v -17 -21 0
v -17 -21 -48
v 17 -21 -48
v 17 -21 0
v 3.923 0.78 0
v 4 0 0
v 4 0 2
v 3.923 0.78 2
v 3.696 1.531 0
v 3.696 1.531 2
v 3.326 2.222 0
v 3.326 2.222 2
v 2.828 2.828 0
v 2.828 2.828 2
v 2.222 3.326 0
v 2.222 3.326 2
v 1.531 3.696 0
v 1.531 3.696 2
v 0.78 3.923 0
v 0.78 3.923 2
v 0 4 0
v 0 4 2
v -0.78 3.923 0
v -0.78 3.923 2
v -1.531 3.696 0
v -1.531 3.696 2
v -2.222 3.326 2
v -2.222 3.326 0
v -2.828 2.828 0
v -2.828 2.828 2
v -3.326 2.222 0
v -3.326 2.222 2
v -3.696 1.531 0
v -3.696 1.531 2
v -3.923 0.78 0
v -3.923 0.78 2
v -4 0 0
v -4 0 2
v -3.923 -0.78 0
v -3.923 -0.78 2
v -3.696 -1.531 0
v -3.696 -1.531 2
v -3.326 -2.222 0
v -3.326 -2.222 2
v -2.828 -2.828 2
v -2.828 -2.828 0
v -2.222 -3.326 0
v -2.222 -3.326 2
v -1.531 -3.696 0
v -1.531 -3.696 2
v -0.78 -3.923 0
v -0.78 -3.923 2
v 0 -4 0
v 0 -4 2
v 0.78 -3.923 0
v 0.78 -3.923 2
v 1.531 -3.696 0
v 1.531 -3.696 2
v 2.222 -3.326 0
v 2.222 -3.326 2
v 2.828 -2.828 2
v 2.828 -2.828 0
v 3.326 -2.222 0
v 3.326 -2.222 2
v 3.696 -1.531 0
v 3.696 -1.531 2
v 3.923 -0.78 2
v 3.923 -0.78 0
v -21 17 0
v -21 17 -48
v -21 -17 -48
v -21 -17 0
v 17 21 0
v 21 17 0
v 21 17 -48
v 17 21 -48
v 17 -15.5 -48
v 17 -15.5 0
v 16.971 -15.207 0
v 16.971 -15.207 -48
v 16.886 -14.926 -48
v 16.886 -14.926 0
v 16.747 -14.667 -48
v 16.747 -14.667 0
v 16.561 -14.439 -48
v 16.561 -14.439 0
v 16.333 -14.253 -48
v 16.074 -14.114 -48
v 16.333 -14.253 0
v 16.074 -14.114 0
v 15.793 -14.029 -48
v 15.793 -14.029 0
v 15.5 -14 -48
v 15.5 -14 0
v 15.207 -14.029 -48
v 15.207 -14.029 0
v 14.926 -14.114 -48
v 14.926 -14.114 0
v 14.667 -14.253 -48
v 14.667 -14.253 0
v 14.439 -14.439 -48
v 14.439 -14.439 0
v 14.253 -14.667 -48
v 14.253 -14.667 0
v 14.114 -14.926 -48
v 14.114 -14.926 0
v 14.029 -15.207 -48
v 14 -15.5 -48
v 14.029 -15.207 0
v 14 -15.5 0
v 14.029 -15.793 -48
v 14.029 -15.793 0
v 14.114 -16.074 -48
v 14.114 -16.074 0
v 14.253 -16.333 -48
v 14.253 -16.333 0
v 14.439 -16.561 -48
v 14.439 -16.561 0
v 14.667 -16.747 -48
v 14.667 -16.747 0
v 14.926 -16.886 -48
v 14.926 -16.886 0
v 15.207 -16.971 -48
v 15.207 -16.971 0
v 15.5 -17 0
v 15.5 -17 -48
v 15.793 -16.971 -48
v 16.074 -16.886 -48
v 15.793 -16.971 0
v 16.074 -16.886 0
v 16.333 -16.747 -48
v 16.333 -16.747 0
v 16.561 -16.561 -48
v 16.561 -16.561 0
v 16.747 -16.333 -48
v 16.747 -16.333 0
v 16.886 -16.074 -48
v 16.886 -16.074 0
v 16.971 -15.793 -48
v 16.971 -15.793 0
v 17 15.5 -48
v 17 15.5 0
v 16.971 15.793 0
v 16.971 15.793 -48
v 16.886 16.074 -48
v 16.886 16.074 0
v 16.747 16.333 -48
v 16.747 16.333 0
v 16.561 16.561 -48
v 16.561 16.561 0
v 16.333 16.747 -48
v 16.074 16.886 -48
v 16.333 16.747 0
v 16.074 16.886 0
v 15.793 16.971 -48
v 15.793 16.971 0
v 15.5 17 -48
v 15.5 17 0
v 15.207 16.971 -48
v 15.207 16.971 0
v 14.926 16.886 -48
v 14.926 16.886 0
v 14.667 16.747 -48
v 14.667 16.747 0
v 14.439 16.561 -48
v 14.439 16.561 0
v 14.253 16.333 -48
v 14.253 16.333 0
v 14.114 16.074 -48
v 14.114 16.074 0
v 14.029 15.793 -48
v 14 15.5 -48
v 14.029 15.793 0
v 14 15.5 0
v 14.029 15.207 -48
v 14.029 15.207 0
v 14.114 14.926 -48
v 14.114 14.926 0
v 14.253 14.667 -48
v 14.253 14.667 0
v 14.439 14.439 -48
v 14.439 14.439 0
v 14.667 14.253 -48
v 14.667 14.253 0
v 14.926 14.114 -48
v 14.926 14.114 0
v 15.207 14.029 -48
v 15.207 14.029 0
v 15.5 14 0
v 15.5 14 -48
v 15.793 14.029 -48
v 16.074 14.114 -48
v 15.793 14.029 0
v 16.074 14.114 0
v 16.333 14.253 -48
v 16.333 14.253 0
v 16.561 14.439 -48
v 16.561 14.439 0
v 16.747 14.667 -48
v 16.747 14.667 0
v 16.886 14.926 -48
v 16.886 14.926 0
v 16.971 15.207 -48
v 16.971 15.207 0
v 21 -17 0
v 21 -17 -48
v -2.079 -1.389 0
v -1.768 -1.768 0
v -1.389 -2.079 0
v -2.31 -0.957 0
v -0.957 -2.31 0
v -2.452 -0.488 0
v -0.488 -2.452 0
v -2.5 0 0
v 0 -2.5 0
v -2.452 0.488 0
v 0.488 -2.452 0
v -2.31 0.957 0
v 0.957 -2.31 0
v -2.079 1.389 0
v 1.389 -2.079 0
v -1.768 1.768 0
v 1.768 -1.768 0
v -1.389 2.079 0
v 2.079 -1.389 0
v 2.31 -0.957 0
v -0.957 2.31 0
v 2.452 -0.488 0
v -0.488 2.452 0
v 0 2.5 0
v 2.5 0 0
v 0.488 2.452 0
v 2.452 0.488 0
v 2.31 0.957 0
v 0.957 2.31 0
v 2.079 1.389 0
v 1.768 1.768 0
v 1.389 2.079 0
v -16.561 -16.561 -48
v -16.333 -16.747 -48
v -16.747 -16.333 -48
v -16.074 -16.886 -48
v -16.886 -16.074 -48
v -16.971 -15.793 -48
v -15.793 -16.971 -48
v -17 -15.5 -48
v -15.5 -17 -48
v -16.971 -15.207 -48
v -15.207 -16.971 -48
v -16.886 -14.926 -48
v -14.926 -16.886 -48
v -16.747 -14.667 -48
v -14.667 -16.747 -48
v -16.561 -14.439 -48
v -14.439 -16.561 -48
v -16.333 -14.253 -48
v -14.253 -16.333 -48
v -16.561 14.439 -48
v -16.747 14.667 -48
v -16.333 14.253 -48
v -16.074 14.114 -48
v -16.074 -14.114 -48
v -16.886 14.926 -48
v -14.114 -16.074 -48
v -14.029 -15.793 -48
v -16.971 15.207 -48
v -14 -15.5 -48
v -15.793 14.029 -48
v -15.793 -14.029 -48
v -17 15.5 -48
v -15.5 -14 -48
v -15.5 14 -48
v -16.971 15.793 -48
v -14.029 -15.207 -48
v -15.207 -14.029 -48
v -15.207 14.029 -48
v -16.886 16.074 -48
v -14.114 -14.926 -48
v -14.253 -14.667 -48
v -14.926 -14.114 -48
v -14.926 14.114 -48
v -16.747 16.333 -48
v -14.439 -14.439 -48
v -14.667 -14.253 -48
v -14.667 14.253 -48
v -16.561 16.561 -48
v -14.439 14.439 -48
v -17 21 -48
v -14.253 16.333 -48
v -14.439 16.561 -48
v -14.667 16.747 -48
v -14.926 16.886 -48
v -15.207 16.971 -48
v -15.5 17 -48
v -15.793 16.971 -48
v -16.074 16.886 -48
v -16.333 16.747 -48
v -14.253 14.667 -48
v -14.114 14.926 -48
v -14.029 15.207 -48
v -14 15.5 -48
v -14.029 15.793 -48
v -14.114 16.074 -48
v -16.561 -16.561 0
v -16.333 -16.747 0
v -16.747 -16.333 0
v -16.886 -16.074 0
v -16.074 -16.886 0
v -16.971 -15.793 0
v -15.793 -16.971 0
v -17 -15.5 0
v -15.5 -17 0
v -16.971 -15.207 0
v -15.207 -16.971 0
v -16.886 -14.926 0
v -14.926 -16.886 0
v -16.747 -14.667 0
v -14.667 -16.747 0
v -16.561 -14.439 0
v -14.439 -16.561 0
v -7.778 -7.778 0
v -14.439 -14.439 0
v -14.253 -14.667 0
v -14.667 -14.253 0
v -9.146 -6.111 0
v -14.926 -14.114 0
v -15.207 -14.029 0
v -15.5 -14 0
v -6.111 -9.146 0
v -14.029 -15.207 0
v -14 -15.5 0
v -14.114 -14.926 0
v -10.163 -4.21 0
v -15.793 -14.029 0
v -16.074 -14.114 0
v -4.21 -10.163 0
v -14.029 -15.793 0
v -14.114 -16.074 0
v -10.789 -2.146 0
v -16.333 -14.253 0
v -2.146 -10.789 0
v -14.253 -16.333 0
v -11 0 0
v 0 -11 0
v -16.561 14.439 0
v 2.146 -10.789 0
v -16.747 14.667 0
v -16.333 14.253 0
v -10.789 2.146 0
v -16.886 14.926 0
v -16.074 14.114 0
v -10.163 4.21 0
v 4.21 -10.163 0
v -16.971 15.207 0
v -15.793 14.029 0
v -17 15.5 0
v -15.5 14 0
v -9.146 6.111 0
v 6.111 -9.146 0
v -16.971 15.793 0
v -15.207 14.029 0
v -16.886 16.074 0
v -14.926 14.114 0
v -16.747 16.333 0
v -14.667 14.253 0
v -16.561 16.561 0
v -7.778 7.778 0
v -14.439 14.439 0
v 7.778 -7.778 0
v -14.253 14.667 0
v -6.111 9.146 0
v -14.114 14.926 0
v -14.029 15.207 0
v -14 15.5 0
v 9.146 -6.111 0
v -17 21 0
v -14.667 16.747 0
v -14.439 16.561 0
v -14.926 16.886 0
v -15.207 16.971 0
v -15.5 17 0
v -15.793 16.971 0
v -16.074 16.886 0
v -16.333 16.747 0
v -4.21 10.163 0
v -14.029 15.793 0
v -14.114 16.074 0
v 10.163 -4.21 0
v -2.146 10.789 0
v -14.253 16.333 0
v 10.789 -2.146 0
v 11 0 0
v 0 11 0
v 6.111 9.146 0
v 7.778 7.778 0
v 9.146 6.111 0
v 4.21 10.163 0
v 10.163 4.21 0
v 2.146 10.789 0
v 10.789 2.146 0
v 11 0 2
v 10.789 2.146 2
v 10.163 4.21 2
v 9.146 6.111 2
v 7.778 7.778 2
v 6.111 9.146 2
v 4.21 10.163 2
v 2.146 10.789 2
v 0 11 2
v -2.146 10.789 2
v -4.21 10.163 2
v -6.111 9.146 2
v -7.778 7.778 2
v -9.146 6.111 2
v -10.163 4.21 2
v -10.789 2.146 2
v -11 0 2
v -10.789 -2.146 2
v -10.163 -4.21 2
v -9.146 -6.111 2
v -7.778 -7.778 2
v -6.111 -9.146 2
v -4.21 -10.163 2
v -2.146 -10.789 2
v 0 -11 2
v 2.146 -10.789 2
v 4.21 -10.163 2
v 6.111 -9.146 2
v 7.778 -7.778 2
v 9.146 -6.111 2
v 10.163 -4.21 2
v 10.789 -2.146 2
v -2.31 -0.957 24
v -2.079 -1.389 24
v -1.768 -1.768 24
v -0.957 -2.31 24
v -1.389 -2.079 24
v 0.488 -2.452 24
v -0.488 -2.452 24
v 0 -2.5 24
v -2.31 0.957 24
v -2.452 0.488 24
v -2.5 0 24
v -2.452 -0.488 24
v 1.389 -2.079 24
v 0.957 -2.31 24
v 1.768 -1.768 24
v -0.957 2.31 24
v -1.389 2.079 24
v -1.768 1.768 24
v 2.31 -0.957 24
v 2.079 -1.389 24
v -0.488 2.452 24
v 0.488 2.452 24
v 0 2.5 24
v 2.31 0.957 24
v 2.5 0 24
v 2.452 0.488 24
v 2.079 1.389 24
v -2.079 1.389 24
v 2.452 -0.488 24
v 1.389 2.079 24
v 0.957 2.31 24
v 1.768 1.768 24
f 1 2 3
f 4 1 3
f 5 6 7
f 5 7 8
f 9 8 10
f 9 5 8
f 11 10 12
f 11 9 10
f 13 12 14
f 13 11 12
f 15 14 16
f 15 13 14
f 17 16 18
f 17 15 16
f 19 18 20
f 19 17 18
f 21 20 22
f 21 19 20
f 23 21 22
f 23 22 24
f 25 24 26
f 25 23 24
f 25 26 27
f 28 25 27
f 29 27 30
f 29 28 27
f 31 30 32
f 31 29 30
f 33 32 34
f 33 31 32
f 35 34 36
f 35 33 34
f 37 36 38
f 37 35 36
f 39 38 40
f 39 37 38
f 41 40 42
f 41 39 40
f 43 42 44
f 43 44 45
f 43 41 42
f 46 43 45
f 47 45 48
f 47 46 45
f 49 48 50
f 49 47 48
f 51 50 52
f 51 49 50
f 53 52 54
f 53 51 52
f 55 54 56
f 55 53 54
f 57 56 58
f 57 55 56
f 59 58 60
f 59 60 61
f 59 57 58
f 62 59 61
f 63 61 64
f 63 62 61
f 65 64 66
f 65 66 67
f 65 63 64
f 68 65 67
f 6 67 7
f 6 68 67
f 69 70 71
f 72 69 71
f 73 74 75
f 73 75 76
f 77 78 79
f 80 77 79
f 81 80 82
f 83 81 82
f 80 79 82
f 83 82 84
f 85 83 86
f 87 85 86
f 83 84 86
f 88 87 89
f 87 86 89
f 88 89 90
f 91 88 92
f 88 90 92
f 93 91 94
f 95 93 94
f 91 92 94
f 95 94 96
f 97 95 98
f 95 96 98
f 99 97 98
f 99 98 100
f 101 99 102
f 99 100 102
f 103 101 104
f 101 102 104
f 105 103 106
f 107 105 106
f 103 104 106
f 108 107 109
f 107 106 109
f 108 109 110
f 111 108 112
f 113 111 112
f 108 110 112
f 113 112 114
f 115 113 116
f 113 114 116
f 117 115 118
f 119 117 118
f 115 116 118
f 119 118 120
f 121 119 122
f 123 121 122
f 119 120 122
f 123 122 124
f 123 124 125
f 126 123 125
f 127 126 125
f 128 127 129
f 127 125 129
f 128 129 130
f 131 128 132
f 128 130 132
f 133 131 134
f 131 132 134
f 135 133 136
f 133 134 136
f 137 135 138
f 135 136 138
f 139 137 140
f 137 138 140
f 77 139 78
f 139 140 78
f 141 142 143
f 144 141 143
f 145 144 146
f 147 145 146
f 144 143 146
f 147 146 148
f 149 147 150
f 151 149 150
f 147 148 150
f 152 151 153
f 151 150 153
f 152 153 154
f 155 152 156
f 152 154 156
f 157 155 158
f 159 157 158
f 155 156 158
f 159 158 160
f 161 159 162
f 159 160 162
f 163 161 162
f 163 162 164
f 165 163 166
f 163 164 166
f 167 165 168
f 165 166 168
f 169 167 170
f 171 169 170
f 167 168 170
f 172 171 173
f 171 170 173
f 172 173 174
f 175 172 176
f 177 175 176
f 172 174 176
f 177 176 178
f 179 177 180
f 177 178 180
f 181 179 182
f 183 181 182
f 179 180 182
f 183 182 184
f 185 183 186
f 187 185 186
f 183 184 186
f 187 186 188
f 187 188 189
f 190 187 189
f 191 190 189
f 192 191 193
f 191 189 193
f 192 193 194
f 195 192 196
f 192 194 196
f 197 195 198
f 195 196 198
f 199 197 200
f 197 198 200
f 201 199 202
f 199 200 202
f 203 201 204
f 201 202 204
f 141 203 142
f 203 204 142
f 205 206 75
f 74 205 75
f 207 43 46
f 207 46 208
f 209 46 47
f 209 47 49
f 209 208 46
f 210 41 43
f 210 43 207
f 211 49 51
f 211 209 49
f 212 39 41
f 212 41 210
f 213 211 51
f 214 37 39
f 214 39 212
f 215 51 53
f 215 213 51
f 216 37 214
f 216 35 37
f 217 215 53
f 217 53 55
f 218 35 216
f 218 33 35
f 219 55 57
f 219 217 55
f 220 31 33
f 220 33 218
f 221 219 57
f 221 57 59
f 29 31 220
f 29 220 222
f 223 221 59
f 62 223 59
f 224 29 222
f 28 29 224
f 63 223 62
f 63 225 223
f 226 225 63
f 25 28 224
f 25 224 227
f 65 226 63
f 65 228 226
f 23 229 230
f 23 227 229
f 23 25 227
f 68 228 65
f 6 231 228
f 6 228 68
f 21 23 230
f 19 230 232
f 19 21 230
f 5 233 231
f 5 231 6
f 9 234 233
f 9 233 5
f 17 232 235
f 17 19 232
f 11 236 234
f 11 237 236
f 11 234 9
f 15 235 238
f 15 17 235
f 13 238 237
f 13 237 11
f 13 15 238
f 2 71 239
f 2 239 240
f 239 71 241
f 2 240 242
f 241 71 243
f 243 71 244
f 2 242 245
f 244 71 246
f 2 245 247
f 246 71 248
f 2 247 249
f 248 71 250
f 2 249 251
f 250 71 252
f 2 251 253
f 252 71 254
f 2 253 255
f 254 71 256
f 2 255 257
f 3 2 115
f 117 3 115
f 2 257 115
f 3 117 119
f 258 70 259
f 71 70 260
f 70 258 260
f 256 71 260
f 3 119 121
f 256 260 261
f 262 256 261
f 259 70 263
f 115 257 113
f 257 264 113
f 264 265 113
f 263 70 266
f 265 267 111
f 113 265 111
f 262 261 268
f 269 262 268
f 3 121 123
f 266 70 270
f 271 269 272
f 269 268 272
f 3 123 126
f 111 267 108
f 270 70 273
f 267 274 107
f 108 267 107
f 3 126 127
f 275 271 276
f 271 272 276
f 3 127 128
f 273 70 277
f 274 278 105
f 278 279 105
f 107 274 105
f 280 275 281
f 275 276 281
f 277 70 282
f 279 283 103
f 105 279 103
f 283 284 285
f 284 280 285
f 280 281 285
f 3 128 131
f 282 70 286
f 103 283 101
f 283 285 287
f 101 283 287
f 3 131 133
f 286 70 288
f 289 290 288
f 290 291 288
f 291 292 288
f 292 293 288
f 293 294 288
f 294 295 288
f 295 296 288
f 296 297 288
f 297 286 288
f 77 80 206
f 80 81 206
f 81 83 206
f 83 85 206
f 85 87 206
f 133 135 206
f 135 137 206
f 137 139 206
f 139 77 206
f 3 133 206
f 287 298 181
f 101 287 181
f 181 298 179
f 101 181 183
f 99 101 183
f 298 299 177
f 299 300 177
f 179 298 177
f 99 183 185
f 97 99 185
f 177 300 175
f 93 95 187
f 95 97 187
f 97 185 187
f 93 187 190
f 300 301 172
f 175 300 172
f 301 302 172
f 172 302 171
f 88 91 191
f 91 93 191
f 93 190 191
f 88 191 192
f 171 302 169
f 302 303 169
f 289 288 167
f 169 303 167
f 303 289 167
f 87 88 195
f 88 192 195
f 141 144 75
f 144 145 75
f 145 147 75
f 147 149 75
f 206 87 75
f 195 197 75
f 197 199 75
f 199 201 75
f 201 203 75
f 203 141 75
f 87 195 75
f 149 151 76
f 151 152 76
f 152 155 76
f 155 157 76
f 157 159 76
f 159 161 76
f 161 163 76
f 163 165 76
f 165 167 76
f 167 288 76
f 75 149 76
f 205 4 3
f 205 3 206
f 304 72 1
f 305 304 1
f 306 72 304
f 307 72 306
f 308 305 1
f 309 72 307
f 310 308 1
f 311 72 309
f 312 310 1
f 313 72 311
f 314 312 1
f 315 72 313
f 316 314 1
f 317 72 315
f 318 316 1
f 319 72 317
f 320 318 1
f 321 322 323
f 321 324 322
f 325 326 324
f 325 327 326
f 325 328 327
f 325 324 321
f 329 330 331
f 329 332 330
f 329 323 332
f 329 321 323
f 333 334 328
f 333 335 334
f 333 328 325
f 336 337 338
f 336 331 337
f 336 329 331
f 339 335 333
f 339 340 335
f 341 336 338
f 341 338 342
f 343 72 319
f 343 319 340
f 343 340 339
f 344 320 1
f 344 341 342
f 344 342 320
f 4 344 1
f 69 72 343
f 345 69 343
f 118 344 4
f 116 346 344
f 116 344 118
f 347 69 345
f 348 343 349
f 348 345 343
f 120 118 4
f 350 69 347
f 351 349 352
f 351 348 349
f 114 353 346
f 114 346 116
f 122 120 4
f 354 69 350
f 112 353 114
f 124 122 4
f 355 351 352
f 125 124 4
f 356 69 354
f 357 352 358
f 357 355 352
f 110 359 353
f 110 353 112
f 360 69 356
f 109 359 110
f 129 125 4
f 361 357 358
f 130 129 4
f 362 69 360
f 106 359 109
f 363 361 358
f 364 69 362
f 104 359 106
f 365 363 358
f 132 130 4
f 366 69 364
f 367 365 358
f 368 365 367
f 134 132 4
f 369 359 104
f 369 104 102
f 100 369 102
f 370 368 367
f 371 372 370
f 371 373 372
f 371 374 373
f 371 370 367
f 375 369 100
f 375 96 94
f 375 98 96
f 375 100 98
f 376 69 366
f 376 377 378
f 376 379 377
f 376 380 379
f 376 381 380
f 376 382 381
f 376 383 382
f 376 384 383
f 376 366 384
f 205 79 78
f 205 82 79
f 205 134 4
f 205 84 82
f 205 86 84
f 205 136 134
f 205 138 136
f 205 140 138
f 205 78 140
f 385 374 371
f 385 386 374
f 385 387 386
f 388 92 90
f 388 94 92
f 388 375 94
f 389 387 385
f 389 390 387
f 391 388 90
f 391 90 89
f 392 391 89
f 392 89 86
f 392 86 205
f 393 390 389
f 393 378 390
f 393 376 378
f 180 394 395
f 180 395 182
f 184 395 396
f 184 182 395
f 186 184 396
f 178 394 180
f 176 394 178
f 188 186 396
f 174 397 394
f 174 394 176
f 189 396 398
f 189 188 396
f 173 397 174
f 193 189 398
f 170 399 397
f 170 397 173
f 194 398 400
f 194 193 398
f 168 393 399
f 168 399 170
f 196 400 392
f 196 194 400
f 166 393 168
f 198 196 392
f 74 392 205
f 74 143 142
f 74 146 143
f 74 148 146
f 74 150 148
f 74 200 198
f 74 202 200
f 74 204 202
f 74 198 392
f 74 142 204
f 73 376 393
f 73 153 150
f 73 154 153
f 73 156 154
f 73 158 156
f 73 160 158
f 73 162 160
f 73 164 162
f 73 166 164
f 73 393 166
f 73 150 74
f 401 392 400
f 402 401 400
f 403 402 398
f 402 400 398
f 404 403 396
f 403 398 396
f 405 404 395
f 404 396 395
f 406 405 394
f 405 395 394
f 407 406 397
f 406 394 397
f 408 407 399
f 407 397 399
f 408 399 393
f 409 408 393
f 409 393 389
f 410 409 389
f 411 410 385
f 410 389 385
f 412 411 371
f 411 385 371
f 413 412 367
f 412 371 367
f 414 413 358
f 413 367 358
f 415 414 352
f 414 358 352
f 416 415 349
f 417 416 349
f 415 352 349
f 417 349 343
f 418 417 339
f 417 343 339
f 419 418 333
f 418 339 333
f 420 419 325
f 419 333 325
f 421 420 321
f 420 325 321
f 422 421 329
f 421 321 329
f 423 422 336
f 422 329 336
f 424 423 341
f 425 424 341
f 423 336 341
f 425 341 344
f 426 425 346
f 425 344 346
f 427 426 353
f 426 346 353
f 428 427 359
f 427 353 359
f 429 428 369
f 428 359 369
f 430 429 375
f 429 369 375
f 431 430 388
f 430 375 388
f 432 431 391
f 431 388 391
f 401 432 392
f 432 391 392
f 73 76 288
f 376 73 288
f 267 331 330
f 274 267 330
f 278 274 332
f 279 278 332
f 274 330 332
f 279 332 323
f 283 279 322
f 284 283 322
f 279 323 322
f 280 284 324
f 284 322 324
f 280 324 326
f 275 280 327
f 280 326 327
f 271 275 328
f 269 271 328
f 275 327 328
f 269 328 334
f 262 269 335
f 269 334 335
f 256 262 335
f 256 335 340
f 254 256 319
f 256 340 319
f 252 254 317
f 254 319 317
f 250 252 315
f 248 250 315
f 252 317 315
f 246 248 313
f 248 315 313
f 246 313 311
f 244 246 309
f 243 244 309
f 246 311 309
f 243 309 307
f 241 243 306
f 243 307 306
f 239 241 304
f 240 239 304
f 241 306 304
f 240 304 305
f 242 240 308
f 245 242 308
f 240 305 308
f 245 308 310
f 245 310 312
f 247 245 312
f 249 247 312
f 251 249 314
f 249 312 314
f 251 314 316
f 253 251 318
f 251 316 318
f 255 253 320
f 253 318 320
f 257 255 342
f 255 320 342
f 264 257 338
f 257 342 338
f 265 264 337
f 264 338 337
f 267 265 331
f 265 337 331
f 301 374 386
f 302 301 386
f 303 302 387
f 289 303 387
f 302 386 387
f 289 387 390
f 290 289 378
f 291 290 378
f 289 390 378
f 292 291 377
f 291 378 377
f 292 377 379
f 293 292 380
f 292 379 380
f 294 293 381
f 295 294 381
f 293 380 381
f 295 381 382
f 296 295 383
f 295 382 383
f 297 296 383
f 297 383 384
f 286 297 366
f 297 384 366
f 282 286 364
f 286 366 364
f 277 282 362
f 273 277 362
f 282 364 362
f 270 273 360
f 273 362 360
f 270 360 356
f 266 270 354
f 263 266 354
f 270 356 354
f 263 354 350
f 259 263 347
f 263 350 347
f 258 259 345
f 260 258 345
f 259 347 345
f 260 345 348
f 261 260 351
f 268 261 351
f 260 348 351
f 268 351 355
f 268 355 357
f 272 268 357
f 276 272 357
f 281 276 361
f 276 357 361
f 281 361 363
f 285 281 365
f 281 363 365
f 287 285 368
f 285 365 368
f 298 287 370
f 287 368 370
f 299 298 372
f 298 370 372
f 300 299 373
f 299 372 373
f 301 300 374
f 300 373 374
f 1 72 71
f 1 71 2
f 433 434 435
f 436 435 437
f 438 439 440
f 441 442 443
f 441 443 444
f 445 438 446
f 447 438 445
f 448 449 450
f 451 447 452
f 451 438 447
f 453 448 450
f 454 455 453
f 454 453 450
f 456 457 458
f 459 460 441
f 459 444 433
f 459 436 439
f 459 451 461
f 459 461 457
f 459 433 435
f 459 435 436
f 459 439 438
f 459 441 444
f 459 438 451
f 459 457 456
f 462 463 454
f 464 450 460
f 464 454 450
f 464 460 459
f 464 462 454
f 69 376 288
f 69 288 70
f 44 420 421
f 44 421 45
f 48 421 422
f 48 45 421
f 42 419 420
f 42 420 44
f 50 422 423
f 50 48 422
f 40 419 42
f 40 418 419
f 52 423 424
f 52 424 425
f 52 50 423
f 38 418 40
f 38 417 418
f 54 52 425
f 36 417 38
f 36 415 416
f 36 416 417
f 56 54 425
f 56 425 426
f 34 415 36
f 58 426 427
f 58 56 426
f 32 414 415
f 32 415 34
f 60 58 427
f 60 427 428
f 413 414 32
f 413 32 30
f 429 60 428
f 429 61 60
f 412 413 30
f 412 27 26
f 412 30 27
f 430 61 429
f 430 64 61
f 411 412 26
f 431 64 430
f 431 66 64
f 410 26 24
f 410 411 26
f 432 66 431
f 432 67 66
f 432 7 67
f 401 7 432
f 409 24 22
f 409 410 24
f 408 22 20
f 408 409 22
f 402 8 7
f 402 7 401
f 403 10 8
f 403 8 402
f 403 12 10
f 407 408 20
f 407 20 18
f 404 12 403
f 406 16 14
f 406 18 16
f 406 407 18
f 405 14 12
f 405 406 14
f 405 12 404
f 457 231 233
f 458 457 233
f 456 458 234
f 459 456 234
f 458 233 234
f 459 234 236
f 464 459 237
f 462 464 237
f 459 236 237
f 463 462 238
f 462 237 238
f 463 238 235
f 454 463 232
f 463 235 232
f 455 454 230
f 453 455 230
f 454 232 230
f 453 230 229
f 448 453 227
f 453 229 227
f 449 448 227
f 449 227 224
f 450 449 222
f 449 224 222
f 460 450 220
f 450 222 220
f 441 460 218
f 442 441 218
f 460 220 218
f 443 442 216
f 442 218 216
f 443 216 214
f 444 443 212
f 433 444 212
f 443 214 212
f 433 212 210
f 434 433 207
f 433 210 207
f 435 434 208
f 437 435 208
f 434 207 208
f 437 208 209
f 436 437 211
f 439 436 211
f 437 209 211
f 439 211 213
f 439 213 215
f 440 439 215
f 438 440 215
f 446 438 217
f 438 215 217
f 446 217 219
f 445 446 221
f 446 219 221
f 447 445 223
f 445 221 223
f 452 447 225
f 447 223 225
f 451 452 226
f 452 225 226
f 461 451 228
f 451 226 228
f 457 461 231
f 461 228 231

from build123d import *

# Parameters (mm, degrees)
F0_R     = 1.5
F1_DEPTH = 48
F2_R     = 11
F2_R_2   = 4
F3_DEPTH = 2
F4_R     = 2.5
F5_DEPTH = 24


with BuildPart() as f1:
    # F0 (on Top) → F1 (new body)
    with BuildSketch(Plane.XY):
        Polygon((-21, 17), (-21, 0), (-21, -17), (-17, -21), (0, -21), (17, -21), (21, -17), (21, 0), (21, 17), (17, 21), (0, 21), (-17, 21), align=None)
        with Locations((-15.5, -15.5)):
            Circle(F0_R, mode=Mode.SUBTRACT)
        with Locations((15.5, -15.5)):
            Circle(F0_R, mode=Mode.SUBTRACT)
        with Locations((-15.5, 15.5)):
            Circle(F0_R, mode=Mode.SUBTRACT)
        with Locations((15.5, 15.5)):
            Circle(F0_R, mode=Mode.SUBTRACT)
    extrude(amount=-F1_DEPTH)

    # F2 (on face) → F3 (join)
    with BuildSketch(Plane.XY):
        Circle(F2_R)
        Circle(F2_R_2, mode=Mode.SUBTRACT)
    extrude(amount=F3_DEPTH)

    # F4 (on face) → F5 (join)
    with BuildSketch(Plane.XY):
        Circle(F4_R)
    extrude(amount=F5_DEPTH)


solid = f1.part
